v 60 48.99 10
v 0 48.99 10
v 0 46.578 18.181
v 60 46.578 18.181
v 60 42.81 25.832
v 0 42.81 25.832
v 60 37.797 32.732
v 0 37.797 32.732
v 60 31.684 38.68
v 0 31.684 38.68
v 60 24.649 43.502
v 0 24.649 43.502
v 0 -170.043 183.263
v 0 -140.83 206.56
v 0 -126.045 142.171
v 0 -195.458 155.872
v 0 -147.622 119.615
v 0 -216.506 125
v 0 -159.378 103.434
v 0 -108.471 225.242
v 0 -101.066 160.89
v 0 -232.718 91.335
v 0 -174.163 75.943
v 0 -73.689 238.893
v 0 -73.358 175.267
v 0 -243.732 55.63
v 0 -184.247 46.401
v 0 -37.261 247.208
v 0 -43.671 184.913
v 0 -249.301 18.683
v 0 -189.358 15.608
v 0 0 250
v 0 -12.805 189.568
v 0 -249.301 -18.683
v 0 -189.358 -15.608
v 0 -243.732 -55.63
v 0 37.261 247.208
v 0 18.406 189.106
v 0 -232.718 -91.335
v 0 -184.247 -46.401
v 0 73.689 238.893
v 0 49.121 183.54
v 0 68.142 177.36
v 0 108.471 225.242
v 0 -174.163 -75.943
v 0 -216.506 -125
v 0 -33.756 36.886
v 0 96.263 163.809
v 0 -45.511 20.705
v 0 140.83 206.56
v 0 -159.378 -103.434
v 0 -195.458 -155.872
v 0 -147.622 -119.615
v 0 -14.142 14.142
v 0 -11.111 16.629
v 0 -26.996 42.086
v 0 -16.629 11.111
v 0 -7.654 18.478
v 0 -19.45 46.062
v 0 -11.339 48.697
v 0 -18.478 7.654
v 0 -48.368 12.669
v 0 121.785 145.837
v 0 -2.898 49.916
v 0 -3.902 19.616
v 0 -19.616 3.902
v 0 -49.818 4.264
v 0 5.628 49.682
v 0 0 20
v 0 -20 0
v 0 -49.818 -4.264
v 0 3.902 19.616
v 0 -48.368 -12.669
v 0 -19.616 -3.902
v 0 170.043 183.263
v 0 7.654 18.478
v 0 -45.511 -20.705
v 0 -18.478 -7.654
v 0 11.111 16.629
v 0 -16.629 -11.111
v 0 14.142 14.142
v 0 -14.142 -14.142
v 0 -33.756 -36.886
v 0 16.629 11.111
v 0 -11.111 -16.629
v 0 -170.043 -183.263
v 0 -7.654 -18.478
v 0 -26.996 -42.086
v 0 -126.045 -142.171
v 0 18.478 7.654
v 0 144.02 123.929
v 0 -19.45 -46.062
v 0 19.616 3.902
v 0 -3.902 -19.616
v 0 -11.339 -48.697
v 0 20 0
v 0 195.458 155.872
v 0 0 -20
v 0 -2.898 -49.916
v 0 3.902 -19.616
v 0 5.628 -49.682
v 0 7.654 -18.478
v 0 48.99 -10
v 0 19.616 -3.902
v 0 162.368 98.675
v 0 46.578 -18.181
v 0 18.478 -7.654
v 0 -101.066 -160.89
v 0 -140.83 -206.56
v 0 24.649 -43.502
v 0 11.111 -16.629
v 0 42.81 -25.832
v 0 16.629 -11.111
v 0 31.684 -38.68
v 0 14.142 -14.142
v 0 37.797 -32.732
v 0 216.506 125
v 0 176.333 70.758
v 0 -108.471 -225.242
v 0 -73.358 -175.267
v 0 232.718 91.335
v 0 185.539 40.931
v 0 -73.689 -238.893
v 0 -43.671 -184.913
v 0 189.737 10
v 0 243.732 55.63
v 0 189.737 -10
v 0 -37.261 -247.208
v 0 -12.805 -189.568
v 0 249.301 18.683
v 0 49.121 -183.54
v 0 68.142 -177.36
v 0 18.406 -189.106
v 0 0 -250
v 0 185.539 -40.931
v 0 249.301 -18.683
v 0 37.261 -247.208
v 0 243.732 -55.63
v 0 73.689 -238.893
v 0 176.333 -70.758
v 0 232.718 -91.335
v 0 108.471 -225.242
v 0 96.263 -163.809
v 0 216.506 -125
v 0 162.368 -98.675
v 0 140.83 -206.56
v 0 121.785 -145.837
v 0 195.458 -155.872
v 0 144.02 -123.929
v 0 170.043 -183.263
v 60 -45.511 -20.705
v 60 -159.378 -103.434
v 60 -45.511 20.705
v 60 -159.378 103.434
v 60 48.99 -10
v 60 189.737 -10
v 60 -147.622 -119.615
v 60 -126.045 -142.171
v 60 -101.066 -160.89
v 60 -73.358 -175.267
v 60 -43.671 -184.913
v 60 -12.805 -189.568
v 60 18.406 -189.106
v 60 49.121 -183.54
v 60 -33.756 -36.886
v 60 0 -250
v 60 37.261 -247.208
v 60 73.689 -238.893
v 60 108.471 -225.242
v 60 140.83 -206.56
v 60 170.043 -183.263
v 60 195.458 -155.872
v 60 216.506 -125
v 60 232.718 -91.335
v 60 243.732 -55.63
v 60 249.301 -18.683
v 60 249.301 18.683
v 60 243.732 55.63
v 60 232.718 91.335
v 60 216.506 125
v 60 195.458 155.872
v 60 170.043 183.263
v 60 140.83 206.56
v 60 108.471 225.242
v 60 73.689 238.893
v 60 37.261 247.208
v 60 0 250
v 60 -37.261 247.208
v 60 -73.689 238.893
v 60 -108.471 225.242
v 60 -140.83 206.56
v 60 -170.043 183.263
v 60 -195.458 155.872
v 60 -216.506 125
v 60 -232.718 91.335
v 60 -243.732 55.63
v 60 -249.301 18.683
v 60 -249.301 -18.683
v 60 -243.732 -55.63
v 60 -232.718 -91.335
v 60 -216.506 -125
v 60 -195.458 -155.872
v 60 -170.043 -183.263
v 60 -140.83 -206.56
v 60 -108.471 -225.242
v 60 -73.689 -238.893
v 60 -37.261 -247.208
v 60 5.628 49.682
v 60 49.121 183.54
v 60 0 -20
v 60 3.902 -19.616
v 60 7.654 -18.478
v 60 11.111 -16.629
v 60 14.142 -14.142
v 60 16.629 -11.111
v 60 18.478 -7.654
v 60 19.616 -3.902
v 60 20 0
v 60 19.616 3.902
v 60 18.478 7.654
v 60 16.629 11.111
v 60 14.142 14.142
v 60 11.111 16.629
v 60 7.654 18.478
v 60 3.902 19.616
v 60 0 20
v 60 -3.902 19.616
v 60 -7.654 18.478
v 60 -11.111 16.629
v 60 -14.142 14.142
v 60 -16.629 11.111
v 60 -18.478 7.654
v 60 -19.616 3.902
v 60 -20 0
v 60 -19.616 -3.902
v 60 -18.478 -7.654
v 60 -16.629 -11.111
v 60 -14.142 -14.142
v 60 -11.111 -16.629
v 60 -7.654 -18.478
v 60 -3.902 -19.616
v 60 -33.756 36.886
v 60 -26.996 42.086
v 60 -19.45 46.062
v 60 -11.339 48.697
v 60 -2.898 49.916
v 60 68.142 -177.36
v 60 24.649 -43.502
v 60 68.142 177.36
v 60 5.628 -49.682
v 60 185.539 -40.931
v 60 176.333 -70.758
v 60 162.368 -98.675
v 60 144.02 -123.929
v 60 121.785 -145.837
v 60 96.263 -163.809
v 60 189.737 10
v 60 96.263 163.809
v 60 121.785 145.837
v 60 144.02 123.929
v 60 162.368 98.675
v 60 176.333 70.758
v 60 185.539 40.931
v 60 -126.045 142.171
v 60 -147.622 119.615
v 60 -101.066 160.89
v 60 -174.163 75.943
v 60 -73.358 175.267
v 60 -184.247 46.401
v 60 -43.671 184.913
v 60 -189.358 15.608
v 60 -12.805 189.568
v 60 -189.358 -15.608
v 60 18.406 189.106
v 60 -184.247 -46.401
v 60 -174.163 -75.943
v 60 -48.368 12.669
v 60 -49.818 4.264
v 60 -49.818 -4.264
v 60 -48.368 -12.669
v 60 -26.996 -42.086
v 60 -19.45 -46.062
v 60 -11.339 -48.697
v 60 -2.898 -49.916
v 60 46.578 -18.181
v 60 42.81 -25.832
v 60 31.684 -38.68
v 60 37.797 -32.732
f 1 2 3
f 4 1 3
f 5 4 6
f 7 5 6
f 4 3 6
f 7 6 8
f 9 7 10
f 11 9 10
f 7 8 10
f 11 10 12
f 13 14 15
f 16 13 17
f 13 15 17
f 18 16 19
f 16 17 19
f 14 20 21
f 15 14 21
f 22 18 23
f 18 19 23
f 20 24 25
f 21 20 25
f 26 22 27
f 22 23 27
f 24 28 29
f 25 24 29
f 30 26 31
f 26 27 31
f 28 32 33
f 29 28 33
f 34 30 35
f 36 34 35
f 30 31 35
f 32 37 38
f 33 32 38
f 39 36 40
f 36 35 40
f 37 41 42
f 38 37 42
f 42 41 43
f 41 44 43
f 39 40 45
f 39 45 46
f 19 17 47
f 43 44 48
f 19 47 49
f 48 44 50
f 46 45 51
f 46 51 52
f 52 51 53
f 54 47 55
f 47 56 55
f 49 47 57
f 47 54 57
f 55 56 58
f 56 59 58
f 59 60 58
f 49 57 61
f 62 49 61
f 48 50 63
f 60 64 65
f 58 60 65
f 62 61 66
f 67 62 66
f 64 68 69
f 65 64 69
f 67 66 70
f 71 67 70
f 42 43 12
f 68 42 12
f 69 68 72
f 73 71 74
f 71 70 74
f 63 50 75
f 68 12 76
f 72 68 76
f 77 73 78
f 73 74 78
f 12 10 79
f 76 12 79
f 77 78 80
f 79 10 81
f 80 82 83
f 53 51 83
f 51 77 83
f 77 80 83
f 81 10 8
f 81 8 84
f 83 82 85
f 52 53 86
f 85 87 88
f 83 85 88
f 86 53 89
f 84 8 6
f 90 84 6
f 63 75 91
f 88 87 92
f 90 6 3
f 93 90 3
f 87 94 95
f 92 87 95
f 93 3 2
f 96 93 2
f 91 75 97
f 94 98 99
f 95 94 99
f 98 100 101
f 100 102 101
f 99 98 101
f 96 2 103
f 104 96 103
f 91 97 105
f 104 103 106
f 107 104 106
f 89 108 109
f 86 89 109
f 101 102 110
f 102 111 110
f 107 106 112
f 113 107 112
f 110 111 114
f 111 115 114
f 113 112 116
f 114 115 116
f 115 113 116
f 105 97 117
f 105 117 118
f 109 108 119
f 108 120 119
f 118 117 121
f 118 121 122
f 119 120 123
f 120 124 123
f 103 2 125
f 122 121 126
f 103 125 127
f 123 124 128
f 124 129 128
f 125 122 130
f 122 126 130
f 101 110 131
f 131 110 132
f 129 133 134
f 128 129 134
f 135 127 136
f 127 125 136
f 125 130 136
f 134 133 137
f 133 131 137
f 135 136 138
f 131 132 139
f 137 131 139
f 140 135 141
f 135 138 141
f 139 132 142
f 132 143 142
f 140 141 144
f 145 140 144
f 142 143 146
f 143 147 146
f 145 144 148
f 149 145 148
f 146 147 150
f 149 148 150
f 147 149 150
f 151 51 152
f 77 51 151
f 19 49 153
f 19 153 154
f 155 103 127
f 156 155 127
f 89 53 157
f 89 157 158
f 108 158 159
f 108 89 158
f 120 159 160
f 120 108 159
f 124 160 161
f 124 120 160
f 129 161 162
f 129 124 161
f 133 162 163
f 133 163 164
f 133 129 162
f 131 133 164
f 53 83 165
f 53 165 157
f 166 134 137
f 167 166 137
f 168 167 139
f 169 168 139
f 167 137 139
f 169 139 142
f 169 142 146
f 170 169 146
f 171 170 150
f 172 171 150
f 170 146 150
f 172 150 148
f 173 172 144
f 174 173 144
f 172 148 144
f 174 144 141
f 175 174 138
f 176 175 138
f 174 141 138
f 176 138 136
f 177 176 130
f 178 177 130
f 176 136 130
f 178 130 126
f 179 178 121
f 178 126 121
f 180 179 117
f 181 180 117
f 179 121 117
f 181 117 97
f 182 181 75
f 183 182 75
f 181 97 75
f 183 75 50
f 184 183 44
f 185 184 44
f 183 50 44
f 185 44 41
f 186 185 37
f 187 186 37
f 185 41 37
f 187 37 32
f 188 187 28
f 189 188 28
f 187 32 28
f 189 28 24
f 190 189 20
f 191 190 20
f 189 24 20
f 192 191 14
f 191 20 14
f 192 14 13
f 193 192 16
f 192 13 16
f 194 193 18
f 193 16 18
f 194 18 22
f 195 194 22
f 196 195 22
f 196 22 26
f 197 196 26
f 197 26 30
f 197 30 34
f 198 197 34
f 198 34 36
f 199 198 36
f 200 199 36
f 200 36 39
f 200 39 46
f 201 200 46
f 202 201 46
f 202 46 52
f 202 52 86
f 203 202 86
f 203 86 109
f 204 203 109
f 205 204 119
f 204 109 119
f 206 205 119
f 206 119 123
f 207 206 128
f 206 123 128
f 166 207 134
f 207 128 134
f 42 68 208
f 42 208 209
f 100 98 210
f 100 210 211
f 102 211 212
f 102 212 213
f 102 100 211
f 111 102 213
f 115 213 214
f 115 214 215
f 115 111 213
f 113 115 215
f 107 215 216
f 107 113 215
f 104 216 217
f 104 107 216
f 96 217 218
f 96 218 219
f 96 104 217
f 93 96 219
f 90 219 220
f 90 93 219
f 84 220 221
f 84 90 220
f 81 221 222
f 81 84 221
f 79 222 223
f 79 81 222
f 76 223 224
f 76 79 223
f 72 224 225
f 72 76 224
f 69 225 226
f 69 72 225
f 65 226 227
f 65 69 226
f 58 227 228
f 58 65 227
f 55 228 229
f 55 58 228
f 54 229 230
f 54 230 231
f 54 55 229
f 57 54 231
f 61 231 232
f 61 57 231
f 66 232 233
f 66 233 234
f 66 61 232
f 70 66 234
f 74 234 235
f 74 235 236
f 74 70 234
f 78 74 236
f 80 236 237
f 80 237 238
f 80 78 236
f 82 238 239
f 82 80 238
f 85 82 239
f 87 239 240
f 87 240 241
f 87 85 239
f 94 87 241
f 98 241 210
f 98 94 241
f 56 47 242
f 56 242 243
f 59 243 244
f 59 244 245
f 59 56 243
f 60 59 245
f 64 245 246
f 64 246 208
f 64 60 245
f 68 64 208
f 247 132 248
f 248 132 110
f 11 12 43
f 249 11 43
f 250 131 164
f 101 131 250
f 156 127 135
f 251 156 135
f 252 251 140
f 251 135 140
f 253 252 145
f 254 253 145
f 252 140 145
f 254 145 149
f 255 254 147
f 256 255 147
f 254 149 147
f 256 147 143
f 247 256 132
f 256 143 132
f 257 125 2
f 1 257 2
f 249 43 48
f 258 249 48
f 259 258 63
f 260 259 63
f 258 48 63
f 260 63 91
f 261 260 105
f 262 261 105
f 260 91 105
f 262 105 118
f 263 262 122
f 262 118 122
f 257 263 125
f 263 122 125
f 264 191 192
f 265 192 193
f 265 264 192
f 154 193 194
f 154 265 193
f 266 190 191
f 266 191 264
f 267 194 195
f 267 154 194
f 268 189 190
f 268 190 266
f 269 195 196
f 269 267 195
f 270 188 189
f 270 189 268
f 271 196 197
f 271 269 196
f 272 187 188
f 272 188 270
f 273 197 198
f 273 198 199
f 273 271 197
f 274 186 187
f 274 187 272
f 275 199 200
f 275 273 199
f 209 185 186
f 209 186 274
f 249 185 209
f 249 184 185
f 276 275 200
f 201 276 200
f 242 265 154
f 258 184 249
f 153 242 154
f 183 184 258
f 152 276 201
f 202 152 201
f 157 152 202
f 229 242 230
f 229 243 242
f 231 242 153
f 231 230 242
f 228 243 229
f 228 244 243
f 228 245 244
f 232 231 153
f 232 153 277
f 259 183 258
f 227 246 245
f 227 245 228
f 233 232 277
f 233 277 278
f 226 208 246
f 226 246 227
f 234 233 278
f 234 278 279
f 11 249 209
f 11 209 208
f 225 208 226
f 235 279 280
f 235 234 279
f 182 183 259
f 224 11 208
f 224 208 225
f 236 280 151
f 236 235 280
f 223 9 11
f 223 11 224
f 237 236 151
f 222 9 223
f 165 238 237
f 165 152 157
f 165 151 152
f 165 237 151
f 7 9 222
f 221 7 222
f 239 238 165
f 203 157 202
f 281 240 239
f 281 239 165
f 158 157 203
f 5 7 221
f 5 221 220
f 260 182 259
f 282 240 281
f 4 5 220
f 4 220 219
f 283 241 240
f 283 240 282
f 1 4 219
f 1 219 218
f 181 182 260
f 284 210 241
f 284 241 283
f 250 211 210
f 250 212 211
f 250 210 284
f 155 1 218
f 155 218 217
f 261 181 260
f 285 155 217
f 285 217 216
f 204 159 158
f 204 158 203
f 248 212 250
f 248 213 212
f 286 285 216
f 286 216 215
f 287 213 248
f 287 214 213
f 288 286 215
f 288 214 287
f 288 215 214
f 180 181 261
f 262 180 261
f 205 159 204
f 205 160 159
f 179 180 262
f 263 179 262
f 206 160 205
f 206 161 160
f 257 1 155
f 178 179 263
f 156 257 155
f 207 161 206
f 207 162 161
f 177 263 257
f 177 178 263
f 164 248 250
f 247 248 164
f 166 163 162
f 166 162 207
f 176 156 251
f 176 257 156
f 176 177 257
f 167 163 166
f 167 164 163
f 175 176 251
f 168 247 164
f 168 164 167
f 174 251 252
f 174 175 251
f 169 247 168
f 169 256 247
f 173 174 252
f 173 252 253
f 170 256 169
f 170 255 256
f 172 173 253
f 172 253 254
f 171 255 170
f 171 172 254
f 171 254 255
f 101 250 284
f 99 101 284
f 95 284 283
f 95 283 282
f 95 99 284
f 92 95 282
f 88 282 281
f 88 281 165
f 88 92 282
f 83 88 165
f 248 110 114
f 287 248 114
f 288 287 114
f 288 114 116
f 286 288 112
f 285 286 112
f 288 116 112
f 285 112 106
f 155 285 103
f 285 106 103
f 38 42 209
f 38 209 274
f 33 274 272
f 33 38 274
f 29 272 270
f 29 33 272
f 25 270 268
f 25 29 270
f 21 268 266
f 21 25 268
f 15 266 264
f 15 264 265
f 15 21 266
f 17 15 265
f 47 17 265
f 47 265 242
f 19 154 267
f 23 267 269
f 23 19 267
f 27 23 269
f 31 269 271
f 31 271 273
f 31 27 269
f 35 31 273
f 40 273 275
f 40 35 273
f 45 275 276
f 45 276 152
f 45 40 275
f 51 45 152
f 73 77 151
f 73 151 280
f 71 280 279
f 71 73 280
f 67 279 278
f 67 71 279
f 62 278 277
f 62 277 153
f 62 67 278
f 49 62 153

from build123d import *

# Parameters (mm, degrees)
SKETCH1_R           = 250
SKETCH1_R_2         = 20
BOSS_EXTRUDE1_DEPTH = 60


with BuildPart() as part:
    # Sketch1 → Boss-Extrude1 (new body)
    with BuildSketch(Plane(origin=(0, 0, 0), x_dir=(0, 0, -1), z_dir=(1, 0, 0))):
        Circle(SKETCH1_R)
        Circle(SKETCH1_R_2, mode=Mode.SUBTRACT)
        with BuildLine():
            Line((177.360116559, 68.142417438), (43.501893686, 24.649244324))
            ThreePointArc((43.501893686, 24.649244324), (29.389262615, 40.450849719), (10, 48.989794856))
            Line((10, 48.989794856), (10, 189.73665961))
            ThreePointArc((10, 189.73665961), (111.679197936, 153.713228931), (177.360116559, 68.142417438))
        make_face(mode=Mode.SUBTRACT)
        with BuildLine():
            Line((-10, 189.73665961), (-10, 48.989794856))
            ThreePointArc((-10, 48.989794856), (-29.389262615, 40.450849719), (-43.501893686, 24.649244324))
            Line((-43.501893686, 24.649244324), (-177.360116559, 68.142417438))
            ThreePointArc((-177.360116559, 68.142417438), (-111.679197936, 153.713228931), (-10, 189.73665961))
        make_face(mode=Mode.SUBTRACT)
        with BuildLine():
            Line((183.540456446, 49.121287113), (49.682233573, 5.628113998))
            ThreePointArc((49.682233573, 5.628113998), (47.552825815, -15.450849719), (36.885648873, -33.755724066))
            Line((36.885648873, -33.755724066), (119.614580282, -147.622329558))
            ThreePointArc((119.614580282, -147.622329558), (180.700738096, -58.713228931), (183.540456446, 49.121287113))
        make_face(mode=Mode.SUBTRACT)
        with BuildLine():
            Line((103.434240394, -159.378034603), (20.705308985, -45.511429112))
            ThreePointArc((20.705308985, -45.511429112), (0, -50), (-20.705308985, -45.511429112))
            Line((-20.705308985, -45.511429112), (-103.434240394, -159.378034603))
            ThreePointArc((-103.434240394, -159.378034603), (0, -190), (103.434240394, -159.378034603))
        make_face(mode=Mode.SUBTRACT)
        with BuildLine():
            Line((-119.614580282, -147.622329558), (-36.885648873, -33.755724066))
            ThreePointArc((-36.885648873, -33.755724066), (-47.552825815, -15.450849719), (-49.682233573, 5.628113998))
            Line((-49.682233573, 5.628113998), (-183.540456446, 49.121287113))
            ThreePointArc((-183.540456446, 49.121287113), (-180.700738096, -58.713228931), (-119.614580282, -147.622329558))
        make_face(mode=Mode.SUBTRACT)
    extrude(amount=BOSS_EXTRUDE1_DEPTH)


solid = part.part
